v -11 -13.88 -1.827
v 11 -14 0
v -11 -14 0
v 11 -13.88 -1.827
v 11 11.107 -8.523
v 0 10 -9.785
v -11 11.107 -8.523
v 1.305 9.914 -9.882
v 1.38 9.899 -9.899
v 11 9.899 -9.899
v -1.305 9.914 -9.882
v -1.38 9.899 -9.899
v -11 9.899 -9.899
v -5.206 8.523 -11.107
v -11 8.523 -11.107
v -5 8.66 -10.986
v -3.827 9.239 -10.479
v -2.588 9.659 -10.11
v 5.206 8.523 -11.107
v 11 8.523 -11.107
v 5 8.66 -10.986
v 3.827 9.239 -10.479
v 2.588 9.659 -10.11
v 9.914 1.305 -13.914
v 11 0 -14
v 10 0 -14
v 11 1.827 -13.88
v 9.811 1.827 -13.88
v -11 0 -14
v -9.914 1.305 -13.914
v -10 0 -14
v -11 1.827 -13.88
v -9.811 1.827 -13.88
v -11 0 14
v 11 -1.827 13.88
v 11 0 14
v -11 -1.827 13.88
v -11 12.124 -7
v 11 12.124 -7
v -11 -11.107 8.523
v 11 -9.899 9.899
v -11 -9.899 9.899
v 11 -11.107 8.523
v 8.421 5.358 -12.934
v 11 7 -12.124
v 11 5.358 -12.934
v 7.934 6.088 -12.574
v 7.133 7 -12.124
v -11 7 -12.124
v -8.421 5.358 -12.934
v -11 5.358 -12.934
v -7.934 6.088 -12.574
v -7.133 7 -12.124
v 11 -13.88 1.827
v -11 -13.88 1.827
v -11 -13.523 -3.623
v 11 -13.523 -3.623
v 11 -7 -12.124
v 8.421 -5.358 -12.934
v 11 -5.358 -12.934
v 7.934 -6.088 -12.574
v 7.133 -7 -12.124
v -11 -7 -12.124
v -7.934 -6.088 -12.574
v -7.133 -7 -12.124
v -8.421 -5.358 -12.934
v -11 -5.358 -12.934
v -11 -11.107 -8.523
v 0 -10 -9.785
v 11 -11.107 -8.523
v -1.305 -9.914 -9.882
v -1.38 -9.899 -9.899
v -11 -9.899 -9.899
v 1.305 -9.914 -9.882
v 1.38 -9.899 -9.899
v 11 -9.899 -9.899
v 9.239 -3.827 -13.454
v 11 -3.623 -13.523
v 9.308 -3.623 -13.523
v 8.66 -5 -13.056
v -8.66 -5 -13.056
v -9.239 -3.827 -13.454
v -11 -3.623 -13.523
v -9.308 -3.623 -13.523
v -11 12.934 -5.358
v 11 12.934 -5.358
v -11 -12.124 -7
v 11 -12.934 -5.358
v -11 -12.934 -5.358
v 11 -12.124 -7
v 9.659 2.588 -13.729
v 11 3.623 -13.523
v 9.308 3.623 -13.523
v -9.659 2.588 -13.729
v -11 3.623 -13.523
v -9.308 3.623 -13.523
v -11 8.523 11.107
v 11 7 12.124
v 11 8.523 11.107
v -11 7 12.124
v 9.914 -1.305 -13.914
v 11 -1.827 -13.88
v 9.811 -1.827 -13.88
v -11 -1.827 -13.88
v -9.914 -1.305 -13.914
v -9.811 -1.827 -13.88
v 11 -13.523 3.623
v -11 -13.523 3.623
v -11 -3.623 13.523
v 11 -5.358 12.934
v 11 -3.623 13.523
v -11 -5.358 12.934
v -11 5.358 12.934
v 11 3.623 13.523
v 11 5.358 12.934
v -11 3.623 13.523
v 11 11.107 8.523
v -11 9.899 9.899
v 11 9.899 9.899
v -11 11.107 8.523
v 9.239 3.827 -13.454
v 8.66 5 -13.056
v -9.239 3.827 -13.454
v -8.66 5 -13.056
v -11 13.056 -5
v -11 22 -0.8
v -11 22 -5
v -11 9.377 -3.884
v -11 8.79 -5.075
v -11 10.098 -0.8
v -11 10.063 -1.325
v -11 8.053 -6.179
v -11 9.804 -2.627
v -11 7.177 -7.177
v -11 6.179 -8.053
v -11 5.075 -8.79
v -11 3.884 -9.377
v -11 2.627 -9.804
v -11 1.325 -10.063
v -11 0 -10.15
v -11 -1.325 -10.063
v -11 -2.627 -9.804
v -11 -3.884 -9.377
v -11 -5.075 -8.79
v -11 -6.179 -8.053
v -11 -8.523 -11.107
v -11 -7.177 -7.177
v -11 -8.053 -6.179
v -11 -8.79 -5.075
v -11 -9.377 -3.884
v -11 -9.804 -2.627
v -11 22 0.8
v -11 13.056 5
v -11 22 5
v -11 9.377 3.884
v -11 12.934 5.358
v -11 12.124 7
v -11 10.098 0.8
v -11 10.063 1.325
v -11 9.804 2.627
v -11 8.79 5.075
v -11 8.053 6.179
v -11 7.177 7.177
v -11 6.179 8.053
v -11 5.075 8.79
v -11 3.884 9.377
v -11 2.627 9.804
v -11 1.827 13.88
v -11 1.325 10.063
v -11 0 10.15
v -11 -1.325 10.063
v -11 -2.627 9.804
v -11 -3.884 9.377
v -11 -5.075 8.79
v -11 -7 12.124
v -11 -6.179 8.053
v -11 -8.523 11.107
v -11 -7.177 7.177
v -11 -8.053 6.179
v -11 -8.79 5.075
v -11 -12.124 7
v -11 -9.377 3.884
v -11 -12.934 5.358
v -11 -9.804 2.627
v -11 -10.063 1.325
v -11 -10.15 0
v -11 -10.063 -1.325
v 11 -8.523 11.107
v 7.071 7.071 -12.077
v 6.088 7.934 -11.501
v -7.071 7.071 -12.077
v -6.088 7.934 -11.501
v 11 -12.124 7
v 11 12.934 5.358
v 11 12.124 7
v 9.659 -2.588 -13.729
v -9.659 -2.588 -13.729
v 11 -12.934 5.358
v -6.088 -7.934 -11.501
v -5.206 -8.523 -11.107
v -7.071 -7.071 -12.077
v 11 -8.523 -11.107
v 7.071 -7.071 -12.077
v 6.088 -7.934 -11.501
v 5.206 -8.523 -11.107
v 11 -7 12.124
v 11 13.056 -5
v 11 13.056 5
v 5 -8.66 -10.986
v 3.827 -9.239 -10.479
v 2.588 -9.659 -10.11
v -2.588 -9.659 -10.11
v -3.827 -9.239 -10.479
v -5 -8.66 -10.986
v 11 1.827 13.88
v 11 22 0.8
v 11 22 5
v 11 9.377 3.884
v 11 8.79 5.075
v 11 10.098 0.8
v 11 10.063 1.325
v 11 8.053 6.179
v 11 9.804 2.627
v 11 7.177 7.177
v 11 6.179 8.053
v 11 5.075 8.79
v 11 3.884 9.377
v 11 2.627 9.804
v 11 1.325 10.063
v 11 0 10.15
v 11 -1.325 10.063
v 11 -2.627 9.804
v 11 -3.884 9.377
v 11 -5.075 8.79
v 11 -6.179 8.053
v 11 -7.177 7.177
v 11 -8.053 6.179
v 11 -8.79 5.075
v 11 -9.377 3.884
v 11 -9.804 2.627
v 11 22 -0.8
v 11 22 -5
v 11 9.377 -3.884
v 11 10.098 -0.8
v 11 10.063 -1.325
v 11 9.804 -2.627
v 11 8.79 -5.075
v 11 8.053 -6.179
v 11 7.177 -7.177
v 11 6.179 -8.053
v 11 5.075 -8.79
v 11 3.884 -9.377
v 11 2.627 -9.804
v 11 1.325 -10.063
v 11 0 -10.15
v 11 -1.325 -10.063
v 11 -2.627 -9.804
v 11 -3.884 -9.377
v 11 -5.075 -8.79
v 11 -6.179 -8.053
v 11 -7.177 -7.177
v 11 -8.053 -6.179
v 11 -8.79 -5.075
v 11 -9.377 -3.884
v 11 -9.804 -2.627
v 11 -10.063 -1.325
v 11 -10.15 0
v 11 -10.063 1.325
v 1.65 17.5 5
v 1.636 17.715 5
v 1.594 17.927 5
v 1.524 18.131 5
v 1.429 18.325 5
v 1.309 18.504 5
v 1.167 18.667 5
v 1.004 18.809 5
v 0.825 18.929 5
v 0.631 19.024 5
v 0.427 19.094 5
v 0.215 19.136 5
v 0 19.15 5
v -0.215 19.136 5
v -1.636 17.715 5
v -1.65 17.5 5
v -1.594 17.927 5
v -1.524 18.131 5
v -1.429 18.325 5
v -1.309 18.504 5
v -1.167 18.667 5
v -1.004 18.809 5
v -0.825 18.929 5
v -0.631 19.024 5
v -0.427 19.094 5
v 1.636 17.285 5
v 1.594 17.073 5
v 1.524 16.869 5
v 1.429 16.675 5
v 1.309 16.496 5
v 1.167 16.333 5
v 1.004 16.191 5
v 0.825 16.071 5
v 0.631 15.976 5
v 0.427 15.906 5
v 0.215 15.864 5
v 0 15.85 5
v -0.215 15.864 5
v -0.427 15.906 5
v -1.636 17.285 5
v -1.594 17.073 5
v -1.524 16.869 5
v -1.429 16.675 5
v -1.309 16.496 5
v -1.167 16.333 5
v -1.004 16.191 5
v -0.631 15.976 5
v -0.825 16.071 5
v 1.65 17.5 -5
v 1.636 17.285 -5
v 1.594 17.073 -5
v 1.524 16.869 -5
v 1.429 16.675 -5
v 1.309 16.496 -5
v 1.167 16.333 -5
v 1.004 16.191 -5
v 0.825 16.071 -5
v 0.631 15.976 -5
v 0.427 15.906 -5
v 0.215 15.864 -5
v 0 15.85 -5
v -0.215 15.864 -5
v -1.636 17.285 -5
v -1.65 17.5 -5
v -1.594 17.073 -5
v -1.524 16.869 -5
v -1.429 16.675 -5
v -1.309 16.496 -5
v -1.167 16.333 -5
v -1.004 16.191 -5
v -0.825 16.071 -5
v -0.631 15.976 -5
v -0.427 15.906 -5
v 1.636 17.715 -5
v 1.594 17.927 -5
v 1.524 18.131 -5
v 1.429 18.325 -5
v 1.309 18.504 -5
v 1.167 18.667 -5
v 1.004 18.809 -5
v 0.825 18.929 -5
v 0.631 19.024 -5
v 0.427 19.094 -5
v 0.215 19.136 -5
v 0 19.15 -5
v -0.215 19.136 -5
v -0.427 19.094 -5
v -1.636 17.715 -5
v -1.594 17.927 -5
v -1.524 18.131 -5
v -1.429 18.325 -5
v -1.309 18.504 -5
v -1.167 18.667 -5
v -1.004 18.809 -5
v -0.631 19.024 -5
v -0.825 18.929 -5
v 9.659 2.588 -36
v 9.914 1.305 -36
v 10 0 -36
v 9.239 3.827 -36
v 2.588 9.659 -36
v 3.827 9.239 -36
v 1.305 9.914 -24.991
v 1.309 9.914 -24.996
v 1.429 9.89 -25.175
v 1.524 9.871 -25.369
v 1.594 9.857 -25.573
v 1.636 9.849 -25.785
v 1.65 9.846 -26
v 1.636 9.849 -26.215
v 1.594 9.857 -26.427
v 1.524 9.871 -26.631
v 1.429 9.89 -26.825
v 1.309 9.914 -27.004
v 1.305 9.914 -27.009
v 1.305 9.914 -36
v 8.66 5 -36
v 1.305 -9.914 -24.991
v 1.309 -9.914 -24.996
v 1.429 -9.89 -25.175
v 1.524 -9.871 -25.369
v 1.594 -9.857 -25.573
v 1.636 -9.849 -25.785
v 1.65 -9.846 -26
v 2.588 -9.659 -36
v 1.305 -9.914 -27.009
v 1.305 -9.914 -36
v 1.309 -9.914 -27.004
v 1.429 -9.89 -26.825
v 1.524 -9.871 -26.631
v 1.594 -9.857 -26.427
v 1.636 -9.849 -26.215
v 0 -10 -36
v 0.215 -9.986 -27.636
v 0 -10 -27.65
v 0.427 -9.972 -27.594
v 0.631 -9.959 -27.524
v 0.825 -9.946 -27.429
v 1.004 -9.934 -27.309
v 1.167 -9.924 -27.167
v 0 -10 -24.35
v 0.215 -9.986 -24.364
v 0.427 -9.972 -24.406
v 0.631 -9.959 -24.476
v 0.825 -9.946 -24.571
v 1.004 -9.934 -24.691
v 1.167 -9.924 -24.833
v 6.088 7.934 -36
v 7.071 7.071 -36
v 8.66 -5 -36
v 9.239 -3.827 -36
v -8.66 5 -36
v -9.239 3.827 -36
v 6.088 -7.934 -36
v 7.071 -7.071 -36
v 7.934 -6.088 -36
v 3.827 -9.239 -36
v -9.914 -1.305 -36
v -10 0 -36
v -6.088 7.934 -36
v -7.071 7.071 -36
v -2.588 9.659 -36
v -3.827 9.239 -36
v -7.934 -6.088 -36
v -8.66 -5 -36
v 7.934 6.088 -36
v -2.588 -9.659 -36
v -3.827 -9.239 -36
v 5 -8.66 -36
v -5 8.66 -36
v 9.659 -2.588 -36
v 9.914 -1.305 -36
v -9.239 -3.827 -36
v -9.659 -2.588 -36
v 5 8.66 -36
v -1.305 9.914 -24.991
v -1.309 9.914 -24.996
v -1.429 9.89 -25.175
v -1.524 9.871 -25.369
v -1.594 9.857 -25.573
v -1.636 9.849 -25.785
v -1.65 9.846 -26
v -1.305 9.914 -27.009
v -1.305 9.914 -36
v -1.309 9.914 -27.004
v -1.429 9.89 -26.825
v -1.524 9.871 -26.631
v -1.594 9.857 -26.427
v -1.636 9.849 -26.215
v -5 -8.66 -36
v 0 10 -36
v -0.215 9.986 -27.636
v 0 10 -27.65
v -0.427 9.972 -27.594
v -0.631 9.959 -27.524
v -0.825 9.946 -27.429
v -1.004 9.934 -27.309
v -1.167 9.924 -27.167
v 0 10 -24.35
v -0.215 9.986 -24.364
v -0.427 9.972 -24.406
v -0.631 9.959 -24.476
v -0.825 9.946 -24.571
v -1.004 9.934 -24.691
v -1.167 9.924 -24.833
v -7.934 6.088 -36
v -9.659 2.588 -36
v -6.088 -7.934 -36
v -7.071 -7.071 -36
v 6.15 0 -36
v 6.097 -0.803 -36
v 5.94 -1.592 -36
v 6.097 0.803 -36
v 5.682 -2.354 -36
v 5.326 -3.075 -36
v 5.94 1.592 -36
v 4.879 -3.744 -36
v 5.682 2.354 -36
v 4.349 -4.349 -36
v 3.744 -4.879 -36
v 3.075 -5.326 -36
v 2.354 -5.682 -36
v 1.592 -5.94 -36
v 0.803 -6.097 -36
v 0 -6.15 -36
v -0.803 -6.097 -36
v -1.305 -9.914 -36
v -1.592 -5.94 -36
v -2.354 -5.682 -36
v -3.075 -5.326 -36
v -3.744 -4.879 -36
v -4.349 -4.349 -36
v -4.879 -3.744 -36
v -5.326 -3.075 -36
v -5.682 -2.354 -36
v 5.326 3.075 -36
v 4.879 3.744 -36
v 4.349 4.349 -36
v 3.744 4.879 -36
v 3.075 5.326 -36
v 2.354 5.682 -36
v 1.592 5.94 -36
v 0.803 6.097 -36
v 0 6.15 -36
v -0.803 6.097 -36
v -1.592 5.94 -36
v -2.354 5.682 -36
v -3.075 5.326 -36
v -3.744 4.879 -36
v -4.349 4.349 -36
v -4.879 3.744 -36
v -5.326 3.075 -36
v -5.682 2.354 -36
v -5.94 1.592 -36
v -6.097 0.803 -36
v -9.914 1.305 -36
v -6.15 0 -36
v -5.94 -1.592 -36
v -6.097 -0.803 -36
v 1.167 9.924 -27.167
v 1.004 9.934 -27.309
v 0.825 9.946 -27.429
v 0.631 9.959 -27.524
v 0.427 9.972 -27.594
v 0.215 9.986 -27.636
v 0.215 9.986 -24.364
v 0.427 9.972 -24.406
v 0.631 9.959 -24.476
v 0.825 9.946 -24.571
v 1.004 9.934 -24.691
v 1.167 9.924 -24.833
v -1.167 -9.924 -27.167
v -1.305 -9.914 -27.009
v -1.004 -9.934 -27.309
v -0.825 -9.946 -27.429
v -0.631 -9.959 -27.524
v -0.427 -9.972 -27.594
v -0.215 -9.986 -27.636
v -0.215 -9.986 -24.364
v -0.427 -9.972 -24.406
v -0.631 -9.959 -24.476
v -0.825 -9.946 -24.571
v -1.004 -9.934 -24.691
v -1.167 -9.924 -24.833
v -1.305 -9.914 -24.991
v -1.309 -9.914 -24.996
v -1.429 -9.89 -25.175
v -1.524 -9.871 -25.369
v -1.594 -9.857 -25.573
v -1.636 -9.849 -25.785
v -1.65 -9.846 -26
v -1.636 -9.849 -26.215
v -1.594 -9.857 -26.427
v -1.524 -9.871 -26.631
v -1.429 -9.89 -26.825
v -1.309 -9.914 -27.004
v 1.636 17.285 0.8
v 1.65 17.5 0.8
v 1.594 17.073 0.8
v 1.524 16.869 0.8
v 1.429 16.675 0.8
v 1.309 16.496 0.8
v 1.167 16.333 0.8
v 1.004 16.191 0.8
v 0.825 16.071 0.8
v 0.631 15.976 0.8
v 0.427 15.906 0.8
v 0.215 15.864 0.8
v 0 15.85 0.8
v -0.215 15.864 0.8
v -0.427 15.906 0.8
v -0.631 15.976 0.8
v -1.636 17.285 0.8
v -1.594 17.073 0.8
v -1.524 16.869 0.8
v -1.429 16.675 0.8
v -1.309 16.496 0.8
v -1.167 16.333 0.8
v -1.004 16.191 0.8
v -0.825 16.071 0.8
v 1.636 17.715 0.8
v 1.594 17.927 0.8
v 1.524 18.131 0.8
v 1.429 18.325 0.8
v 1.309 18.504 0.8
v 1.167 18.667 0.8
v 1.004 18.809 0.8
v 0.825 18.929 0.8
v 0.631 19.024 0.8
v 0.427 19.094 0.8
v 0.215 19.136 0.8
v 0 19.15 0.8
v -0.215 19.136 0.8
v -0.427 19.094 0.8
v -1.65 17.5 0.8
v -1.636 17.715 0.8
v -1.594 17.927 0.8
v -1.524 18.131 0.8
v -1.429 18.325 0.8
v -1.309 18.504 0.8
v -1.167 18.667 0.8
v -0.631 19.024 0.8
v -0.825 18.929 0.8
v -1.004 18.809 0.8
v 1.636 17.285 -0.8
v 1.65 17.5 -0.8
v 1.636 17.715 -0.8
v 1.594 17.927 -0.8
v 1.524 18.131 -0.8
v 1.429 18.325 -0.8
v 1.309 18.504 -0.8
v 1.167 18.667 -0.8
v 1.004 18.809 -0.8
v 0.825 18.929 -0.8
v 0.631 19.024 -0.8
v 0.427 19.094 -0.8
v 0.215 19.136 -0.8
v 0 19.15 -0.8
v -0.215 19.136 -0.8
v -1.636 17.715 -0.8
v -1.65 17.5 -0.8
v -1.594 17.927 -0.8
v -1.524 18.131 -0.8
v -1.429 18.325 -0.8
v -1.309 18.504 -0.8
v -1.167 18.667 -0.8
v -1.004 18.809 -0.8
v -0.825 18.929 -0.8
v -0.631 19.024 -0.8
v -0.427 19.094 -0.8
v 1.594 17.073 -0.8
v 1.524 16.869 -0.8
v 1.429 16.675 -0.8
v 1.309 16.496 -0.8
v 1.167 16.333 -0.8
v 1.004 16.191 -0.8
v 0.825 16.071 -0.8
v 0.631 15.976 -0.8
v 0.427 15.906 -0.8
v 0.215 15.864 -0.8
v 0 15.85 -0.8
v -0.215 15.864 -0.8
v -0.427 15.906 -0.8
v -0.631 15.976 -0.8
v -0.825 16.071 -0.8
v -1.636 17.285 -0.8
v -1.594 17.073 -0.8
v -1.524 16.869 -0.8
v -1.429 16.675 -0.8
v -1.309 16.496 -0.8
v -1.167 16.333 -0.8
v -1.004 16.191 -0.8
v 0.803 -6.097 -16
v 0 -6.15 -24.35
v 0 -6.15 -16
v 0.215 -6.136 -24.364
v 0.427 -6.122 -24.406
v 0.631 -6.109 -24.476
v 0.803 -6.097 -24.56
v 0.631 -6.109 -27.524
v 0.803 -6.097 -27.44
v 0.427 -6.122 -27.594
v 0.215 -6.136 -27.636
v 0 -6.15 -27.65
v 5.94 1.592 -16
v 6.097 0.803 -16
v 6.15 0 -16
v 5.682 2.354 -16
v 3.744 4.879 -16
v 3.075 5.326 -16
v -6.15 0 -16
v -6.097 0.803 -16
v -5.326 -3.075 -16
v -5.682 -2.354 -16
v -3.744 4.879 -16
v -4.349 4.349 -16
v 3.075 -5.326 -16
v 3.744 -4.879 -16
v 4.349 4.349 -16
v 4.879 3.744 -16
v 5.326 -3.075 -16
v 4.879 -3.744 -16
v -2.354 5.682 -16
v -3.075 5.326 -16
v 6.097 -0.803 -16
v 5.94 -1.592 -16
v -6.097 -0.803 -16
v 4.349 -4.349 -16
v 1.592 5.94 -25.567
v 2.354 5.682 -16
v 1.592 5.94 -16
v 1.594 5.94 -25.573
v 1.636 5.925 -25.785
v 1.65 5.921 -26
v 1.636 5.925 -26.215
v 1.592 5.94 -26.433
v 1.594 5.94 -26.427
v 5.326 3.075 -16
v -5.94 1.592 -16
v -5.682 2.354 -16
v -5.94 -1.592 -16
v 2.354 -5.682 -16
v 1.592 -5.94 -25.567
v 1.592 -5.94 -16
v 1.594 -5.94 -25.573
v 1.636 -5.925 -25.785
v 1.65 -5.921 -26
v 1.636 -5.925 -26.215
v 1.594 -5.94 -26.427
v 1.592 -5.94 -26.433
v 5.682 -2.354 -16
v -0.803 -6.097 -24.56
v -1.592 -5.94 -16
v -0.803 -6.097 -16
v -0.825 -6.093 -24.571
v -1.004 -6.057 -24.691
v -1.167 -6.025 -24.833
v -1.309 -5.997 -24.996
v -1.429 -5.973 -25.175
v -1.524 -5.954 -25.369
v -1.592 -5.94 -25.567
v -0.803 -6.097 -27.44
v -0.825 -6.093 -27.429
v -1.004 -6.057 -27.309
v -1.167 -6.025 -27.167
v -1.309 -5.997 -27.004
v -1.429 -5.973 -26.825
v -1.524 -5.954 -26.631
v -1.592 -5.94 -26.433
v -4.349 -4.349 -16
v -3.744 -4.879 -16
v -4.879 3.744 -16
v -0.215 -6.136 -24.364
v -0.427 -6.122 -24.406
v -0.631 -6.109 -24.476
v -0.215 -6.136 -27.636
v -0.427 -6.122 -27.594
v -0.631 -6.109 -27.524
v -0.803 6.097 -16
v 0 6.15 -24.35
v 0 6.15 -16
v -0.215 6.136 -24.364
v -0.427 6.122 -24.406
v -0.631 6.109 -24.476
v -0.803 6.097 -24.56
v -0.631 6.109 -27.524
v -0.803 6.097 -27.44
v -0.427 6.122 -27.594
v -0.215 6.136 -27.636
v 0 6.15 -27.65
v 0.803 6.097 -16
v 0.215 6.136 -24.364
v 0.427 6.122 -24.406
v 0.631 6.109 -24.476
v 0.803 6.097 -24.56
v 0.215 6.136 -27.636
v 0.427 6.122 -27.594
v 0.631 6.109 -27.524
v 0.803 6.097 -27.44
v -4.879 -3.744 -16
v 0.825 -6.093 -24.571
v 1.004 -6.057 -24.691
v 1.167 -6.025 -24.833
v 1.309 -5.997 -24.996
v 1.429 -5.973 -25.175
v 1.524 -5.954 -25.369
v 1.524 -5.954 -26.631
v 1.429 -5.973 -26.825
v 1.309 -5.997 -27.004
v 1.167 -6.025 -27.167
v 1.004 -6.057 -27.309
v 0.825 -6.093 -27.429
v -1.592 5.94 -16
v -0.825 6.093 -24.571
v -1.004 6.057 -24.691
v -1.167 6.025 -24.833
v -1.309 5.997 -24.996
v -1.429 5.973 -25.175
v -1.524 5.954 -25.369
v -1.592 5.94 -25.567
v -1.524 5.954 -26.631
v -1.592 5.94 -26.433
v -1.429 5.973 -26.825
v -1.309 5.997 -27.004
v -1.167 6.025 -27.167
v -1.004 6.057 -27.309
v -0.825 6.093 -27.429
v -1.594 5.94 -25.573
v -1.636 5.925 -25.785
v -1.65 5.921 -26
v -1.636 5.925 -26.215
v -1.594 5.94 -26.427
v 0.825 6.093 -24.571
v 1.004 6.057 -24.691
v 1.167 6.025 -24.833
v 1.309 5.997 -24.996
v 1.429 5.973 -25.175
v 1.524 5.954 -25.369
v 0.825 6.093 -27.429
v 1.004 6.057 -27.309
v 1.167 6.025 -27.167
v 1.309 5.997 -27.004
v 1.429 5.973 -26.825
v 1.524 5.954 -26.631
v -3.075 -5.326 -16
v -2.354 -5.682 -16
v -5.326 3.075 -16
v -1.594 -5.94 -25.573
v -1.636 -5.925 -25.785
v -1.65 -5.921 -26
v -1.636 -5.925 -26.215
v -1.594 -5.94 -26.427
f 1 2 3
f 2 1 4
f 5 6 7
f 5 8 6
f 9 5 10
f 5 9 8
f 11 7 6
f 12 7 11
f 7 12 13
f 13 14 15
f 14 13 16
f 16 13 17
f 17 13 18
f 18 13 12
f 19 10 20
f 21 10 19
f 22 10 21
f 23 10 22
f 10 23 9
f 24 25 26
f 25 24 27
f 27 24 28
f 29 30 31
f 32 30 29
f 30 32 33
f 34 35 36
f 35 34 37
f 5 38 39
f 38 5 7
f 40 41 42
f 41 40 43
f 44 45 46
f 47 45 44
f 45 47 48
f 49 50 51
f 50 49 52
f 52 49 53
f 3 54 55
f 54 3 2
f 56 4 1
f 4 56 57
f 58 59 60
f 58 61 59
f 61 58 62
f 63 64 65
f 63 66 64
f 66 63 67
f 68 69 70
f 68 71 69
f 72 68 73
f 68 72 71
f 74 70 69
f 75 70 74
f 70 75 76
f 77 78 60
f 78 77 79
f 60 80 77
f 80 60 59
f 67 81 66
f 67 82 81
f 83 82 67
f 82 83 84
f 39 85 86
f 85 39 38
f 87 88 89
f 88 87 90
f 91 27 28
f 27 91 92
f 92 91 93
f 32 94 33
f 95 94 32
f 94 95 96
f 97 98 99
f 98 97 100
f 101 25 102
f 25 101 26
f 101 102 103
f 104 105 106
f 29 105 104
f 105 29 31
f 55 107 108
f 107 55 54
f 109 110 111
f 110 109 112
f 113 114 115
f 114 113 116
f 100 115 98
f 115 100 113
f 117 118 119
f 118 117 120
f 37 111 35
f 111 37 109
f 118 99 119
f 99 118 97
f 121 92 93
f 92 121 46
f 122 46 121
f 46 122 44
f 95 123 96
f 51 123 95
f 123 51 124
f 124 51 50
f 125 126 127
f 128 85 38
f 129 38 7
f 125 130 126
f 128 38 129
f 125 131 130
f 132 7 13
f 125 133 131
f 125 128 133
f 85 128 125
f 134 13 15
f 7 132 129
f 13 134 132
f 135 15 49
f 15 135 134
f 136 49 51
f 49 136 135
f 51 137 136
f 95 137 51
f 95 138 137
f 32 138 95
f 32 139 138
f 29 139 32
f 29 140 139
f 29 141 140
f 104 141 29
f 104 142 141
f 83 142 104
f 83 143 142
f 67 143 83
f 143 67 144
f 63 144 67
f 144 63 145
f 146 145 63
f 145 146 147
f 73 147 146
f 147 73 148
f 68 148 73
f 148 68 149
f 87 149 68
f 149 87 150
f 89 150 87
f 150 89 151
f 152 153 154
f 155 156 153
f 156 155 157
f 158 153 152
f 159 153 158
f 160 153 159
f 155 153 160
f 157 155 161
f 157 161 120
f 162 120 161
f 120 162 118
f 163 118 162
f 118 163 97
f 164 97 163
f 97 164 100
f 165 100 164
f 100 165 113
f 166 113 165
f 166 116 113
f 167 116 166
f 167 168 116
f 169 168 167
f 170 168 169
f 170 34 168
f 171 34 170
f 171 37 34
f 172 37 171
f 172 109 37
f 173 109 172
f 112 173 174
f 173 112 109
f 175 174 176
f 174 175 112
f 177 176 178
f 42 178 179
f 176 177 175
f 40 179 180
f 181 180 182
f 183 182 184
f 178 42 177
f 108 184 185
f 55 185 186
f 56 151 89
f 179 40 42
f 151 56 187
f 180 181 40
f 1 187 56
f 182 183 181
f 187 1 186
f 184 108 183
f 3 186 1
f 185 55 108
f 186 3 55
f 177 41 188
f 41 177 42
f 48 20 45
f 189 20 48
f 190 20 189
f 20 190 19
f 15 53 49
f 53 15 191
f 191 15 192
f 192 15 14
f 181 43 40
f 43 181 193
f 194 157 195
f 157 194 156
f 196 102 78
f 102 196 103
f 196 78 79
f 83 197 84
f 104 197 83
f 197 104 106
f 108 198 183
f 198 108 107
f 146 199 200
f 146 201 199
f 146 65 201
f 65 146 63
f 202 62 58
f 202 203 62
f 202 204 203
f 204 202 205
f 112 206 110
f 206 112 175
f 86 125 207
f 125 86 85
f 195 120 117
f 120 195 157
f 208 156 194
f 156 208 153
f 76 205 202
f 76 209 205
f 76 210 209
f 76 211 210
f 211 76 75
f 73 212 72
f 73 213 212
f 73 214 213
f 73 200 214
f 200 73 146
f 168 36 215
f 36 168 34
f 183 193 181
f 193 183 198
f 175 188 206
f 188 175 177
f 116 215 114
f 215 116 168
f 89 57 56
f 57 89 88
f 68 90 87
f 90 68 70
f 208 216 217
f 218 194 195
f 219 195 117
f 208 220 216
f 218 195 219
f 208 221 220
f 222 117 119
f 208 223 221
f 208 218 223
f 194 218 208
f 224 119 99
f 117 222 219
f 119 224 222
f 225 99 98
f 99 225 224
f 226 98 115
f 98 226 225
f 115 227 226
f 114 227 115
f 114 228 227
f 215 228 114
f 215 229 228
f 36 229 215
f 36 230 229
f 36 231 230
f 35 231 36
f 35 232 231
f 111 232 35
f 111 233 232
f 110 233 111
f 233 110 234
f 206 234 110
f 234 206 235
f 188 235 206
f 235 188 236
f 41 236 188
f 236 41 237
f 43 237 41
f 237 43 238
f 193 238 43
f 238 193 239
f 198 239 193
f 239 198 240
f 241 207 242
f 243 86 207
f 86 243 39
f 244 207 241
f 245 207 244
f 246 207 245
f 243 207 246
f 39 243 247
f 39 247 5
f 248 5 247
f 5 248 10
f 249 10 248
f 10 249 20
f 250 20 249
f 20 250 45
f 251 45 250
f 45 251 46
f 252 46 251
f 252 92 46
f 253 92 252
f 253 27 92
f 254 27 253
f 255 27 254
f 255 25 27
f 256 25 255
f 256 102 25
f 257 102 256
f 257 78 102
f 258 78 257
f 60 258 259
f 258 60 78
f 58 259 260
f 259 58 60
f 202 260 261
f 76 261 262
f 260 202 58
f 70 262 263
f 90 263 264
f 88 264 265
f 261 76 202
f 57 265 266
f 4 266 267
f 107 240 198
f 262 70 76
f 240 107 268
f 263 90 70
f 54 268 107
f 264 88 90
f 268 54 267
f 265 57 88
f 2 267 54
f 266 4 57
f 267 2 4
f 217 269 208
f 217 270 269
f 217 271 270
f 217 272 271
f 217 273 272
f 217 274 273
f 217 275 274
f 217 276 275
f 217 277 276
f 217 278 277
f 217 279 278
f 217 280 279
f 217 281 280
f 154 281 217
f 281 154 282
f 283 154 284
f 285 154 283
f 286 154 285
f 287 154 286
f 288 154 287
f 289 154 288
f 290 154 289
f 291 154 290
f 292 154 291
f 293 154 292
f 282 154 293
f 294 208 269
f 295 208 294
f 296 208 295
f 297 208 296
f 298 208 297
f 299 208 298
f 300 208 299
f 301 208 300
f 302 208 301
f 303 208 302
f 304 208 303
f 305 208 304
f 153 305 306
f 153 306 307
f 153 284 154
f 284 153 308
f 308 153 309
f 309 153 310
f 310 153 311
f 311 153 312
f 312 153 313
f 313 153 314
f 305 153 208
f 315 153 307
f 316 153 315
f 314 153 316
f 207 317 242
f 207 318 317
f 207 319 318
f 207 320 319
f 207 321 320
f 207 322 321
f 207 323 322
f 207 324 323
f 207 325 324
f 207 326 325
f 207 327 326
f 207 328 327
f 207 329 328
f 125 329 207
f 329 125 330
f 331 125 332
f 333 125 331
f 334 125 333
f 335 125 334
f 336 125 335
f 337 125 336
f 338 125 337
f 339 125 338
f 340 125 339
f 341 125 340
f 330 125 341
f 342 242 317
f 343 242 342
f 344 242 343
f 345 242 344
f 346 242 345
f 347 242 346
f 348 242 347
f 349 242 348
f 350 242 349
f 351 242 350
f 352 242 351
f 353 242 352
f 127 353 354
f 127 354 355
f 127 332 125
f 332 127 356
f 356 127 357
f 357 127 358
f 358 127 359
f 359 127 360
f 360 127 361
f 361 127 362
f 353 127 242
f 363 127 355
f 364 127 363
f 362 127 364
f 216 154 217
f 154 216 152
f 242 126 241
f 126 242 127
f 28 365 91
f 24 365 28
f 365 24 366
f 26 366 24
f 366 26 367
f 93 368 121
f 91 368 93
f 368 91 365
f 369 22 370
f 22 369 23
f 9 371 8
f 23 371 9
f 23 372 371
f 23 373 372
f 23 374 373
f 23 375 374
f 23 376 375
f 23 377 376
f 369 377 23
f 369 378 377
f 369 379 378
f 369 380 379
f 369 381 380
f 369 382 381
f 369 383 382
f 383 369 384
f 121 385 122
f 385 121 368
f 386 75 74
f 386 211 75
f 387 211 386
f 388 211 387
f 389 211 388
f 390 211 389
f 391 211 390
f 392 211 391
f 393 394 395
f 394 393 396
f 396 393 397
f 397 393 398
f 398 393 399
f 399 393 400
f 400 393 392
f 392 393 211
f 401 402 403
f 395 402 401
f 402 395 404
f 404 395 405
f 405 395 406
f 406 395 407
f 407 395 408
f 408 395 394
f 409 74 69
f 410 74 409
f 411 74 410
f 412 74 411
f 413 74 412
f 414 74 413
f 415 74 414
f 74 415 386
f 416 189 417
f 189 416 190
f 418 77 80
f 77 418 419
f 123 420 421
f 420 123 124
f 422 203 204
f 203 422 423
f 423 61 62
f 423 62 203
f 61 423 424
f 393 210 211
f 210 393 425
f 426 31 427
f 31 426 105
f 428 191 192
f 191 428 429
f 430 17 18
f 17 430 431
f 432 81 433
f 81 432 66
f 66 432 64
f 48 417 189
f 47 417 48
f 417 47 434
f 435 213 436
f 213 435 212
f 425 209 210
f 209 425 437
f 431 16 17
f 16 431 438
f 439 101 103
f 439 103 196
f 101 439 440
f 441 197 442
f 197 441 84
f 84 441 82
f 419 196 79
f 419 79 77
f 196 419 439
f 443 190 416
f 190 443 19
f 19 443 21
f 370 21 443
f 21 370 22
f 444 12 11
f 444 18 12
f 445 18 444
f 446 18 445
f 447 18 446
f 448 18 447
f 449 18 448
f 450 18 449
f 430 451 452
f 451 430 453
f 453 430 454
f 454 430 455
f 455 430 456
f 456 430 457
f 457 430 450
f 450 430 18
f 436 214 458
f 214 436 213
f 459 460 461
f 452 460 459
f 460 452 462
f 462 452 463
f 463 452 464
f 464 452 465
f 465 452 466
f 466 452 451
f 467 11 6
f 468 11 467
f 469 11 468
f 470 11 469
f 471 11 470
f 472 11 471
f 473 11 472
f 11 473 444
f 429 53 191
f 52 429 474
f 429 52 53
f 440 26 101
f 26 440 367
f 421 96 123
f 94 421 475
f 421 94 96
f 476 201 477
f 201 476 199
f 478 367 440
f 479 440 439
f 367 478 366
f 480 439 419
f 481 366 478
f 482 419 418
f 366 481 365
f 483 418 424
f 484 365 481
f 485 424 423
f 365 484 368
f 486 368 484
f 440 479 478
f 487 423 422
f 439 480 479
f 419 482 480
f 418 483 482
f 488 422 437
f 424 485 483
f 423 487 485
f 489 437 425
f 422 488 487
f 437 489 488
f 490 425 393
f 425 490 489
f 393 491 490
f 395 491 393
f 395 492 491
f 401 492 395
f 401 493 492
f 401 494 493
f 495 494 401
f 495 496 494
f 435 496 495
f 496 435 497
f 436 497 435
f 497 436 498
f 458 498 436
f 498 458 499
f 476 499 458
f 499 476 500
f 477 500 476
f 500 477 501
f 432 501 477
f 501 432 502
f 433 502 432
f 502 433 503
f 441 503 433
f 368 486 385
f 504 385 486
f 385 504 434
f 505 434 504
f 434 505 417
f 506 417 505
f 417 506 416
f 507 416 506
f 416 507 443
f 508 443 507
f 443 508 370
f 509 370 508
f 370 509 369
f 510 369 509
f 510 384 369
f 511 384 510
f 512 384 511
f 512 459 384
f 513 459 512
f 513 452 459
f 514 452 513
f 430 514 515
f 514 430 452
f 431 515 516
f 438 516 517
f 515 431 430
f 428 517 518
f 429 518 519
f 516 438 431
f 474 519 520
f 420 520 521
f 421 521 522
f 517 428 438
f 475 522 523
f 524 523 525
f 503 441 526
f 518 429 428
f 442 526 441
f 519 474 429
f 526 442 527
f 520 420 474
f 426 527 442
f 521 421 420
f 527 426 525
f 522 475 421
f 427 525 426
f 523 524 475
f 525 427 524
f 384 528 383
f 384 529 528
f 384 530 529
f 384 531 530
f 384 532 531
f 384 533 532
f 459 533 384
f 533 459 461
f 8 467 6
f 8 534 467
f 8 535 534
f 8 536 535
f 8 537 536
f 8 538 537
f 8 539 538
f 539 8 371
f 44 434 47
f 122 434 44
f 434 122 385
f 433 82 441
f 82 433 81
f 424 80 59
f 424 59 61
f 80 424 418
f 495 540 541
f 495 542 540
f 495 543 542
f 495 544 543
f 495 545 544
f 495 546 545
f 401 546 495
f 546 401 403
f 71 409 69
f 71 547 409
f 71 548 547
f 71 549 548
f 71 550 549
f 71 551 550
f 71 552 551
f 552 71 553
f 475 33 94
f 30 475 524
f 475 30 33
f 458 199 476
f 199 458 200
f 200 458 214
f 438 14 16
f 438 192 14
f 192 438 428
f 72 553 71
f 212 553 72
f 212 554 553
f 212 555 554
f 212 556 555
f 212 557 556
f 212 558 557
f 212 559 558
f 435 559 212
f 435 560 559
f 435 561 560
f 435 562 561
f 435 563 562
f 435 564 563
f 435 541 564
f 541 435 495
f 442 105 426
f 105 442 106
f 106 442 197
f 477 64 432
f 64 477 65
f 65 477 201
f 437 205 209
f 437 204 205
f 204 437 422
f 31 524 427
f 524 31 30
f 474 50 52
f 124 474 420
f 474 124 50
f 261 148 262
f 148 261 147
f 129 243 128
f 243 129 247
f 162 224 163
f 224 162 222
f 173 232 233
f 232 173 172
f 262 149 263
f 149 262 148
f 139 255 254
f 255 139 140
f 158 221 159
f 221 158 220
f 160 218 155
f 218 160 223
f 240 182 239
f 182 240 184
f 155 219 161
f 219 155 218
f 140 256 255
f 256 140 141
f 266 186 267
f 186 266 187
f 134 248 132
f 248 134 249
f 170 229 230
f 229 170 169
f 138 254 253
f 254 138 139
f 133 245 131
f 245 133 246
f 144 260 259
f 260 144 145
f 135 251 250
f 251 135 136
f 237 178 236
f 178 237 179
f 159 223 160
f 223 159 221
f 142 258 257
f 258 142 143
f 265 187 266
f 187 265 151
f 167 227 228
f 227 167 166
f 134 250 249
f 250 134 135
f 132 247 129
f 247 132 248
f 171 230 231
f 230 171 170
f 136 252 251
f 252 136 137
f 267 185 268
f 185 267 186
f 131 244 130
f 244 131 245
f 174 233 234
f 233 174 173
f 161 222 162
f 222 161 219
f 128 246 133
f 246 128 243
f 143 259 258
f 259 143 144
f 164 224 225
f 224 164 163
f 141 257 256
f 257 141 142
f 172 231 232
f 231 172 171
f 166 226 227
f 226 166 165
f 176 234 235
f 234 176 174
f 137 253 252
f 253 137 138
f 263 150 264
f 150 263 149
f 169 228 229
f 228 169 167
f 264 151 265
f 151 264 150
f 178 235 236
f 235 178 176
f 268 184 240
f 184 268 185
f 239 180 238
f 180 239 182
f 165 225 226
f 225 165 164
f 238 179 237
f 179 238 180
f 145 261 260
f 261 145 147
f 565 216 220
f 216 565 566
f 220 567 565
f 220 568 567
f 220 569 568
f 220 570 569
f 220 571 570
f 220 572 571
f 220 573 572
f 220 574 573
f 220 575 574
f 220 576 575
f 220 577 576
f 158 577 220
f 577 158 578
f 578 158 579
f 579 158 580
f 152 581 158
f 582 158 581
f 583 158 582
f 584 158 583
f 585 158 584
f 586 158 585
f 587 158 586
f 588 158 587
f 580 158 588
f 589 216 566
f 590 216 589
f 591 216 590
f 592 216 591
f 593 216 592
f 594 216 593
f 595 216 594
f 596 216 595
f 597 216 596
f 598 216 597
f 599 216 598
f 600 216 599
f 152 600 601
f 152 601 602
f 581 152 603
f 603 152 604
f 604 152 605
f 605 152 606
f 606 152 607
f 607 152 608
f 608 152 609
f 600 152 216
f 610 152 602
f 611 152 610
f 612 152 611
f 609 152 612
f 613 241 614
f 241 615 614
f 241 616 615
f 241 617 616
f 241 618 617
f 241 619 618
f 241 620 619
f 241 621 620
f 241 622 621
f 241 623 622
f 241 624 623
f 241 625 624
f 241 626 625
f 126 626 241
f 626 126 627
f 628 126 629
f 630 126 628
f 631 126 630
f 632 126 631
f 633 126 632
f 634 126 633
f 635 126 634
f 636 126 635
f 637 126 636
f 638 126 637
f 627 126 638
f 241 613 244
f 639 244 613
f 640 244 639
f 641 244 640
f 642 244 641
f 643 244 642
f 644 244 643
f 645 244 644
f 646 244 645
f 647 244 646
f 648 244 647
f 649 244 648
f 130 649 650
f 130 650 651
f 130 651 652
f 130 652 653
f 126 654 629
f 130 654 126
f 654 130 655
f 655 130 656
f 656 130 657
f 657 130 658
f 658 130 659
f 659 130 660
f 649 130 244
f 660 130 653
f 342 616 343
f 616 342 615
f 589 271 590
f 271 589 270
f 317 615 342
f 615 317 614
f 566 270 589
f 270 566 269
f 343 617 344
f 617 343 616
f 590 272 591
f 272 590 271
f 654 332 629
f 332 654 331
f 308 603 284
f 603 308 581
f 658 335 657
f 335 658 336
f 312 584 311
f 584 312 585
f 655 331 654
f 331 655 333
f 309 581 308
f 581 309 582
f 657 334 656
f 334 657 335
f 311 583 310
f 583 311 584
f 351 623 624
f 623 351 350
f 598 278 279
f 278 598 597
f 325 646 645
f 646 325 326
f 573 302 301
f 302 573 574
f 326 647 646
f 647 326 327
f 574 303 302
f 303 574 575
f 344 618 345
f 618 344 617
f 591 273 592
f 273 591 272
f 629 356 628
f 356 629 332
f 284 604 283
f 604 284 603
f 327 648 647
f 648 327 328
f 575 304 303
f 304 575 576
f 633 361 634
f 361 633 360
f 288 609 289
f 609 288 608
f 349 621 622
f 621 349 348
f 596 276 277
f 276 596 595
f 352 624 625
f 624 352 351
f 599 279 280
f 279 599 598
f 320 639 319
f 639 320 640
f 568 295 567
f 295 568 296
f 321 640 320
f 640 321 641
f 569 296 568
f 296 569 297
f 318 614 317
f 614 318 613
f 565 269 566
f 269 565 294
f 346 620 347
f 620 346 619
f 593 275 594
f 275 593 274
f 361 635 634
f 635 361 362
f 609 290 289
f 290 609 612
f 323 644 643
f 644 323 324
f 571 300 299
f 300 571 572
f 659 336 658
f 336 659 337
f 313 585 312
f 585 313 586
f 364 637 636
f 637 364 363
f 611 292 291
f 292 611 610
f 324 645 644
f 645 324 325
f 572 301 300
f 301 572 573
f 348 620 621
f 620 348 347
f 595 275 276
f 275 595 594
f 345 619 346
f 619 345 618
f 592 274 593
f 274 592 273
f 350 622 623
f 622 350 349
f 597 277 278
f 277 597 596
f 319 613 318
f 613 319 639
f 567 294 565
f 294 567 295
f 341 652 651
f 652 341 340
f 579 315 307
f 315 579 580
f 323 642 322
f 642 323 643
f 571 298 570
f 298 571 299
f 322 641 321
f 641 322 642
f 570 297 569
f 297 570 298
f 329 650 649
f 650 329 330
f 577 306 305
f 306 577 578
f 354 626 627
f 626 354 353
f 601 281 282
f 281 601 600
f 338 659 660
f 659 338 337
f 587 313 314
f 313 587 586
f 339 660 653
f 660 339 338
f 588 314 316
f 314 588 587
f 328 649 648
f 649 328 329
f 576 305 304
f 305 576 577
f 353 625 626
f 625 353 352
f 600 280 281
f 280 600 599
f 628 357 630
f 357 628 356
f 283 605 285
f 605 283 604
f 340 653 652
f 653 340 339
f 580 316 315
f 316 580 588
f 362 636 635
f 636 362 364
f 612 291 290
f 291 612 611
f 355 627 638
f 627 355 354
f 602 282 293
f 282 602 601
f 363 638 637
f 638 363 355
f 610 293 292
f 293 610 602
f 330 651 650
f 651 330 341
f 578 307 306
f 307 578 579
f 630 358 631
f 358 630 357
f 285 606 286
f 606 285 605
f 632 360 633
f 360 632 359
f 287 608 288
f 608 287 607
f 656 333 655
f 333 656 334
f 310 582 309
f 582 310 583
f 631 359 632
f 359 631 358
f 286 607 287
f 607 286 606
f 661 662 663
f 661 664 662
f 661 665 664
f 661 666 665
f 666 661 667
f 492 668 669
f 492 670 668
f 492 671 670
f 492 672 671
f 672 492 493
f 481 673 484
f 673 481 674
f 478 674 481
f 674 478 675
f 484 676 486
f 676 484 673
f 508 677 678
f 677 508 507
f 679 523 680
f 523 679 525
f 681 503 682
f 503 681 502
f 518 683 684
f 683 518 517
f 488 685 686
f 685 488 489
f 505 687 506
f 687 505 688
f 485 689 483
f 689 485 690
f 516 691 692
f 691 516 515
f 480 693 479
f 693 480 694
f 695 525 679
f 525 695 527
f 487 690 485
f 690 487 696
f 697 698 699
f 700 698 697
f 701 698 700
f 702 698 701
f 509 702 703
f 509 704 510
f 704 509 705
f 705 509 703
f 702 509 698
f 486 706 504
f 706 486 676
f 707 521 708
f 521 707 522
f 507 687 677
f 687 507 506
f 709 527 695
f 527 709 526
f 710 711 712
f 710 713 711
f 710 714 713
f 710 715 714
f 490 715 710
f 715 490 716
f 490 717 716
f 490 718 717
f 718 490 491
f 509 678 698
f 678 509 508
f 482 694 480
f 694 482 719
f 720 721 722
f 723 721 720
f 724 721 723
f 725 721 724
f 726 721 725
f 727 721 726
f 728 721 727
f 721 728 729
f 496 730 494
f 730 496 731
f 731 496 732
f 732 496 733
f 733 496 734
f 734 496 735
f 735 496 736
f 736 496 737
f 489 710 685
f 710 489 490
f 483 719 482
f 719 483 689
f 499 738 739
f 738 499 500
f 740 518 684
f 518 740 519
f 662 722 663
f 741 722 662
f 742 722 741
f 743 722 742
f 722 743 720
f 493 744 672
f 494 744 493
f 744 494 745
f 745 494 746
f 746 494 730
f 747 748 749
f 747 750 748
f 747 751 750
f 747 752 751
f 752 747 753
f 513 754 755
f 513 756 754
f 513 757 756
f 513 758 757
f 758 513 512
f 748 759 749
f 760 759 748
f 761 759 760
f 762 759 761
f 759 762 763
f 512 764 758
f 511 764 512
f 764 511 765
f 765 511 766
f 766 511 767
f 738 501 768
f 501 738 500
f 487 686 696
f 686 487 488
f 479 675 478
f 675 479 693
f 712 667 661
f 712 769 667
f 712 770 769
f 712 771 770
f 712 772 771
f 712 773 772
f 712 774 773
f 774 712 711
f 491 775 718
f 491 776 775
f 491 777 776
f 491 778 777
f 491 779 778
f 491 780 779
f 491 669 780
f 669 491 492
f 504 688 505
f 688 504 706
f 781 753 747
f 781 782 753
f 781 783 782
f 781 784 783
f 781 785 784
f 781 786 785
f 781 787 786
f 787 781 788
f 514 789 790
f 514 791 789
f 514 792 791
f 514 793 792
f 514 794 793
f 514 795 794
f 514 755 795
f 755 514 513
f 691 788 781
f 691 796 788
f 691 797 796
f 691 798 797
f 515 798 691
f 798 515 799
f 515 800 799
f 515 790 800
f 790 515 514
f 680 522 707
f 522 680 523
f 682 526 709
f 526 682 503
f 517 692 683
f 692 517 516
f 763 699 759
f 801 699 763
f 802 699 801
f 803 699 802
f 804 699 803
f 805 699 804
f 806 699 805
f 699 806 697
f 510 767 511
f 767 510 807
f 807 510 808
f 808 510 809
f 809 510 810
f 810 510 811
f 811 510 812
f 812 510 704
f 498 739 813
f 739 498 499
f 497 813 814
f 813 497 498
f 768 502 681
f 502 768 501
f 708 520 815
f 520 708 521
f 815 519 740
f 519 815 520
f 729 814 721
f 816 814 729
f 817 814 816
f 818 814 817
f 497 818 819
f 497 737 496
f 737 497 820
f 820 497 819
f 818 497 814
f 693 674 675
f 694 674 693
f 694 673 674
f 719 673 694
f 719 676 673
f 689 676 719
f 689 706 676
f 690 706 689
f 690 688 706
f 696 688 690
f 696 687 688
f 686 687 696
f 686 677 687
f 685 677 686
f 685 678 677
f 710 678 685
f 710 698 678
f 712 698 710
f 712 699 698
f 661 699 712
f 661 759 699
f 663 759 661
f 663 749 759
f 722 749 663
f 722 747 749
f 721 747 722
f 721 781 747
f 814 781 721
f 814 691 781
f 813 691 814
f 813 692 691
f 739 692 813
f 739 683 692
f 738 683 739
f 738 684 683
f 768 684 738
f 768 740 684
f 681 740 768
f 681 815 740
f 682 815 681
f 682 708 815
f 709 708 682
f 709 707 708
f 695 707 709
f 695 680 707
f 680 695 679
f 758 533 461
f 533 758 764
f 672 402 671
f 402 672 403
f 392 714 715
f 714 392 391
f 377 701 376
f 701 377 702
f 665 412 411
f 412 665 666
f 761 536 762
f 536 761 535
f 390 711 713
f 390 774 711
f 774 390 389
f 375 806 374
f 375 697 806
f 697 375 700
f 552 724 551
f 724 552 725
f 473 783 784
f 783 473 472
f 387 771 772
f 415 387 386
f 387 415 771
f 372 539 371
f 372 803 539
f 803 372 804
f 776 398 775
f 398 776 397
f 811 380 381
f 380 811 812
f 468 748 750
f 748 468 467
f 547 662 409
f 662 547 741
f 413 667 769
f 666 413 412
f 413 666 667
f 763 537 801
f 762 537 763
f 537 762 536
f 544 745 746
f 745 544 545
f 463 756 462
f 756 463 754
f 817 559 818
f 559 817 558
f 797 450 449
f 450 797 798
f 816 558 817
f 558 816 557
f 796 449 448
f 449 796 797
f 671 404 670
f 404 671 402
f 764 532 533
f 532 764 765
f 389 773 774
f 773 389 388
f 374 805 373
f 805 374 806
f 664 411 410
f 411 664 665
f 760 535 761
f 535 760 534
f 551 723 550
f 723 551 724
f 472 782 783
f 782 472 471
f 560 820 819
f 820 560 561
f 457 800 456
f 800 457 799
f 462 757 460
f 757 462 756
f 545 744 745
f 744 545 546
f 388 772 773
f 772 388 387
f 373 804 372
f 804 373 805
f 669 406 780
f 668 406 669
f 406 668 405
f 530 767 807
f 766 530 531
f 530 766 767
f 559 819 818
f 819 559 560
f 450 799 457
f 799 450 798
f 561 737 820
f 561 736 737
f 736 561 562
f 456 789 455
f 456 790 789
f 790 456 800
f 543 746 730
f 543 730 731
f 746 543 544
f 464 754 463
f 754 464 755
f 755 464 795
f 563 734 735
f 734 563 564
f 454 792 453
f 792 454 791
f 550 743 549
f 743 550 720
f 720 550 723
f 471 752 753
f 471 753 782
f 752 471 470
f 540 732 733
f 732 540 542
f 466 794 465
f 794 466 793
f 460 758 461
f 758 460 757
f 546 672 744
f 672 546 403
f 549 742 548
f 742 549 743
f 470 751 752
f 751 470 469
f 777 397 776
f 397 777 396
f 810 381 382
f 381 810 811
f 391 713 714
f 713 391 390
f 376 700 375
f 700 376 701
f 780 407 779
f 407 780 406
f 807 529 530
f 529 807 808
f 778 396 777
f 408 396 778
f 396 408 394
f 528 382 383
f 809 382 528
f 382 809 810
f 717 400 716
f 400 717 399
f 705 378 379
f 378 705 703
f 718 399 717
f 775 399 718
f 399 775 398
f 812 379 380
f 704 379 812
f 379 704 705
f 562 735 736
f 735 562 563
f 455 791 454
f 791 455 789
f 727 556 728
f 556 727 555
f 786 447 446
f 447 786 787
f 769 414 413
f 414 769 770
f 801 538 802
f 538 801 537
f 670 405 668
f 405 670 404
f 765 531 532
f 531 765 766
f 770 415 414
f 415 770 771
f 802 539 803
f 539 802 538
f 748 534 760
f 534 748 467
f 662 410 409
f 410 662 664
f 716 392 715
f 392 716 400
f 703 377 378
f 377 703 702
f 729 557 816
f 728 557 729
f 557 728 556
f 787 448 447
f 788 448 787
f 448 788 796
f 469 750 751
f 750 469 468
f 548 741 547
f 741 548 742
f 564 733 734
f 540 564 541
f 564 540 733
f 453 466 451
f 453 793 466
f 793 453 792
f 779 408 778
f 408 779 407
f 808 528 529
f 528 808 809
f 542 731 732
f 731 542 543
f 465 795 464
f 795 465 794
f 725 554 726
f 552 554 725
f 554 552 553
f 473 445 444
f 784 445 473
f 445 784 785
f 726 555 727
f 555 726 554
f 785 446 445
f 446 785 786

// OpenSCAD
// file: ../common/ds_lib.scad
// DronSwarm · librería común de piezas del frame (S07-S08). Unidades: mm.
//
// Reglas (ADR-003): sin hull()/minkowski()/offset() — FreeCAD los convierte en malla y el STEP deja de ser un
// sólido válido. Las formas redondeadas se arman con uniones de cubos y cilindros. El importador CSG de FreeCAD
// también falla con booleanas 2D y con varios operandos agrupados bajo una sola transformación: cada grupo de
// agujeros debe ser hijo directo del difference(), con su propio translate.
//
// Interfaz de motor DronSwarm (DMI, ADR-011): placa con 4 ranuras radiales a 90°, de modo que el mismo soporte
// acepta varios patrones comerciales y, más adelante, el motor propio (S17+) se diseña para caer en el mismo rango.
//   DMI-S: 4×M3, círculo de tornillos Ø16-Ø25 (motores 28xx-41xx, ≤ 600 W)
//   DMI-L: 4×M4, círculo de tornillos Ø30-Ø42 (motores 50xx-70xx, ≤ 2 kW)

$fn = 48;

M3 = 3.3; M3_HEAD = 6.0; M3_NUT = 6.4;     // pasante, cabeza, tuerca (entre caras + juego)
M4 = 4.4; M4_HEAD = 7.5;
M5 = 5.4;

function dmi_bolt(iface) = iface == "L" ? M4 : M3;
function dmi_r(iface) = iface == "L" ? [15, 21] : [8, 12.5];   // radio mínimo y máximo de las ranuras
function dmi_plate_d(iface) = iface == "L" ? 56 : 36;
function dmi_center(iface) = iface == "L" ? 16 : 10;            // eje, seguro y paso de cables

// Rectángulo con esquinas redondeadas (2D) y su extrusión
module rrect2d(size, r) {
    r2 = min(r, size[0] / 2 - 0.01, size[1] / 2 - 0.01);
    union() {
        translate([r2, 0]) square([size[0] - 2 * r2, size[1]]);
        translate([0, r2]) square([size[0], size[1] - 2 * r2]);
        for (x = [r2, size[0] - r2], y = [r2, size[1] - r2]) translate([x, y]) circle(r = r2);
    }
}
// Caja redondeada con primitivas 3D (sin booleanas 2D: el importador CSG de FreeCAD falla con ellas)
module rbox(size, r) {
    r2 = min(r, size[0] / 2 - 0.01, size[1] / 2 - 0.01);
    union() {
        translate([r2, 0, 0]) cube([size[0] - 2 * r2, size[1], size[2]]);
        translate([0, r2, 0]) cube([size[0], size[1] - 2 * r2, size[2]]);
        for (x = [r2, size[0] - r2], y = [r2, size[1] - r2]) translate([x, y, 0]) cylinder(r = r2, h = size[2]);
    }
}
module crbox(size, r) { translate([-size[0] / 2, -size[1] / 2, 0]) rbox(size, r); }   // centrado en x/y

// Ranura (2D) entre dos puntos sobre el eje x
module slot2d(r0, r1, w) {
    union() {
        translate([r0, -w / 2]) square([r1 - r0, w]);
        translate([r0, 0]) circle(d = w);
        translate([r1, 0]) circle(d = w);
    }
}

// Agujeros de la interfaz de motor (para restar de una placa de espesor t)
module slot3d(r0, r1, w, h) {
    union() {
        translate([r0, -w / 2, 0]) cube([r1 - r0, w, h]);
        translate([r0, 0, 0]) cylinder(d = w, h = h);
        translate([r1, 0, 0]) cylinder(d = w, h = h);
    }
}
module dmi_holes(iface, t) {
    r = dmi_r(iface);
    translate([0, 0, -1]) union() {
        cylinder(d = dmi_center(iface), h = t + 2);
        for (a = [45, 135, 225, 315]) rotate(a) slot3d(r[0], r[1], dmi_bolt(iface), t + 2);
    }
}

// Soporte de motor en la punta del brazo: manguito sobre el tubo + placa DMI arriba
//   el tubo entra por -x; la placa queda centrada en el eje del motor (origen), cara superior en z = 0
module motor_mount(tube_d, iface = "S", sleeve = 34, wall = 3.5) {
    od = tube_d + 2 * wall;
    pd = dmi_plate_d(iface);
    pt = iface == "L" ? 6 : 4;
    zc = -pt - tube_d / 2 - 1;                 // eje del tubo bajo la placa
    difference() {
        union() {
            translate([0, 0, -pt]) cylinder(d = pd, h = pt);                         // placa DMI
            translate([-sleeve - pd / 2 + 6, 0, zc]) rotate([0, 90, 0])
                cylinder(d = od, h = sleeve + pd / 2 - 6 + 4);                       // manguito
            translate([-sleeve - pd / 2 + 6, -od / 2, zc]) cube([sleeve + pd / 2 - 2, od, -zc - pt + 0.01]);  // alma
            translate([-sleeve - pd / 2 + 6, -5, zc - od / 2 - 7]) cube([sleeve, 10, 8]);   // oreja de apriete
        }
        dmi_holes(iface, pt + 0.02, $fn = 32);
        translate([-sleeve - pd / 2 + 5, 0, zc]) rotate([0, 90, 0]) cylinder(d = tube_d + 0.3, h = sleeve + pd / 2 - 3); // tubo
        translate([-sleeve - pd / 2 + 4, -1, zc - od / 2 - 8]) cube([sleeve + 1, 2, od / 2 + 6]);   // ranura de apriete
        for (x = [0.3, 0.75]) translate([-sleeve - pd / 2 + 6 + x * sleeve, 0, zc - od / 2 - 3])
            rotate([90, 0, 0]) cylinder(d = M3, h = 30, center = true);                // tornillos de apriete
        translate([-pd / 2 - 2, 0, zc]) rotate([0, 90, 0]) cylinder(d = 7, h = pd);   // salida de cables del tubo
    }
}

// Bloque de brazo entre las dos placas centrales (impreso PA12-CF): sujeta el tubo y separa las placas.
//   el tubo sale por +x desde el origen; el bloque ocupa x ∈ [-len, 0], altura = gap
module arm_block(tube_d, gap, len = 40, width = 0, bolt = M3) {
    w = width > 0 ? width : tube_d + 14;
    difference() {
        translate([-len, -w / 2, 0]) rbox([len, w, gap], 2);
        translate([-len - 1, 0, gap / 2]) rotate([0, 90, 0]) cylinder(d = tube_d + 0.2, h = len + 2);   // tubo
        translate([-len - 1, -0.75, gap / 2]) cube([len + 2, 1.5, gap / 2 + 1]);                        // ranura de apriete
        for (p = arm_block_bolts(tube_d, len, w)) translate([p[0], p[1], -1]) cylinder(d = bolt, h = gap + 2);
        translate([-len * 0.5, 0, gap * 0.78]) rotate([90, 0, 0]) cylinder(d = M3, h = w + 2, center = true);  // apriete
    }
}
function arm_block_bolts(tube_d, len, w) =
    [for (x = [-len + 6, -6], y = [-(w / 2 - 3.6), w / 2 - 3.6]) [x, y]];

// Patrón de controladora de vuelo (agujeros M3 en cuadrado)
module fc_holes(pattern, t) {
    for (x = [-1, 1], y = [-1, 1]) translate([x * pattern / 2, y * pattern / 2, -1]) cylinder(d = M3, h = t + 2);
}
// file: ds_i_params.scad
// DS-I · parámetros generados por tools/cad/gen_cad_params.py el 2026-10-19
// desde engineering/data/results (spec v1). No editar a mano: regenerar. Unidades: mm, kg.

vehicle = "DS-I";
rotors = 4;
wheelbase = 672;
arm_radius = 336;
prop_d = 431.8;
tube_od = 20;
tube_wall = 1;
arm_len = 252;
plate_d = 168;
plate_t = 3;
plate_gap = 26;
motor_iface = "S";
battery_dims = [134.4, 76.2, 48.8];
battery = "6S2P 50S";
leg_h = 160;
fold_arms = false;
mtow_kg = 2.695;
motor_mass_kg = 0.074;
fc_pattern = 30.5;
gimbal_box = [90, 70, 105];
gimbal_damper_pitch = [60, 50];
// file: ds_i_frame.scad
// DS-I · geometría compartida del frame: posiciones derivadas de los parámetros (spec v1). Unidades: mm.
// Ejes: x adelante, y izquierda, z arriba. z = 0 es la cara superior de la placa inferior.
// Cada pieza vive en su propio archivo (center_plate.scad, arm_block.scad, …) e incluye este.

include <ds_i_params.scad>
use <../common/ds_lib.scad>
include <../common/ds_lib.scad>

arm_angles = [45, 135, 225, 315];         // quad X
block_len = 40;
block_w = tube_od + 14;
r_block_out = plate_d / 2 - 3;            // extremo exterior del bloque de brazo
tube_z = plate_gap / 2;                   // eje de los tubos
tube_len = arm_radius - r_block_out + block_len - 8;   // dentro del bloque hasta el soporte de motor
leg_offset = 70;                          // patas abrazadas al brazo, a esta distancia del bloque
leg_r = r_block_out + leg_offset;
leg_tube = 12;                            // tubo de las patas Ø12×1
battery_pos = [-28, 0];                   // batería transversal, atrás, bajo la placa
gimbal_pos = [62, 0];                     // cámara adelante, colgada con amortiguadores
housing_size = [120, 90, 58];             // carcasa IP54 sobre la placa superior
housing_pos = [0, 0];

// Contorno de las placas centrales (2D): círculo con lóbulos bajo cada bloque de brazo
module plate_outline() {
    union() {
        circle(d = plate_d, $fn = 96);
        for (a = arm_angles) rotate(a) translate([r_block_out - block_len - 4, -block_w / 2 - 4]) square([block_len + 7, block_w + 8]);
    }
}

// Agujeros comunes a ambas placas: tornillos de los bloques
module plate_common_holes() {
    for (a = arm_angles) rotate(a) translate([r_block_out, 0])
        for (p = arm_block_bolts(tube_od, block_len, block_w)) translate(p) circle(d = M3);
}

// Posiciones de piezas montadas en las placas
gimbal_mount_bolts = [for (x = [-25, 25], y = [-32, 32]) [gimbal_pos[0] - 15 + x, y]];   // adaptador bajo la placa
battery_tray_bolts = [for (x = [-30, 30], y = [-46, 46]) [battery_pos[0] + x, y]];
housing_flange = 10;
// tornillos de la brida a 6 mm de la pared (afuera del canal de la junta, que va de 0.6 a 2.6 mm)
housing_bolts = [[66, 0], [-66, 0], [0, 51], [0, -51], [40, 51], [40, -51], [-40, 51], [-40, -51]];
cable_gland_pos = [-housing_size[0] / 2 + 18, 0];      // paso de cables al interior de la carcasa (prensaestopa M12)
motor_d = motor_iface == "L" ? 62 : 38;   // motor de referencia (COTS, se confirma en S09)
motor_h = motor_iface == "L" ? 36 : 26;
tray_t = 3;                               // bandeja de batería
gm_t = 4;                                 // placas del adaptador de cámara
damper_h = 10;                            // amortiguadores de silicona
foot_h = 45;                              // pie amortiguador de TPU (≈ 30 mm de carrera)
foot_stroke = 30;
// Altura de las patas por condición de diseño: con el pie comprimido, la cámara no toca el suelo (10 mm de margen)
gimbal_bottom_z = -plate_t - 2 * gm_t - damper_h - gimbal_box[2];
ground_z = gimbal_bottom_z - foot_stroke - 10;
leg_top_z = tube_z - (tube_od + 8) / 2 - 2;     // tope del tubo de la pata dentro de la abrazadera
leg_len = (leg_top_z - ground_z) - (foot_h - 12);
mm_sleeve = 26;                           // manguito del soporte de motor (FEA: FS 37 con 34 mm, se acorta)
// main file
// DS-I · abrazadera de pata sobre el brazo (impresa PA12-CF, ×4). Local: eje del brazo = eje x en el origen;
// el tubo de la pata baja por −z desde el casquillo. Ranura horizontal en +y cerrada por un tornillo M3 vertical.
include <ds_i_frame.scad>
module leg_clamp(len = 22, wall = 4) {
    od = tube_od + 2 * wall;
    sock = leg_tube + 2 * wall;
    difference() {
        union() {
            translate([-len / 2, 0, 0]) rotate([0, 90, 0]) cylinder(d = od, h = len);
            translate([-len / 2, od / 2 - 3, -5]) cube([len, 11, 10]);                         // oreja de apriete
            translate([0, 0, -od / 2 - 22]) cylinder(d = sock, h = 22 + od / 2 - 3);            // casquillo de la pata
        }
        translate([-len / 2 - 1, 0, 0]) rotate([0, 90, 0]) cylinder(d = tube_od + 0.3, h = len + 2);
        translate([-len / 2 - 1, 0, -0.8]) cube([len + 2, od / 2 + 10, 1.6]);                   // ranura de apriete
        translate([0, od / 2 + 3.5, 0]) cylinder(d = M3, h = 12, center = true);                // tornillo
        translate([0, 0, -od / 2 - 23]) cylinder(d = leg_tube + 0.3, h = 21);                   // tubo de la pata
        translate([0, 0, -od / 2 - 12]) rotate([90, 0, 0]) cylinder(d = M3, h = sock + 2, center = true);   // pasador
    }
}
leg_clamp();
